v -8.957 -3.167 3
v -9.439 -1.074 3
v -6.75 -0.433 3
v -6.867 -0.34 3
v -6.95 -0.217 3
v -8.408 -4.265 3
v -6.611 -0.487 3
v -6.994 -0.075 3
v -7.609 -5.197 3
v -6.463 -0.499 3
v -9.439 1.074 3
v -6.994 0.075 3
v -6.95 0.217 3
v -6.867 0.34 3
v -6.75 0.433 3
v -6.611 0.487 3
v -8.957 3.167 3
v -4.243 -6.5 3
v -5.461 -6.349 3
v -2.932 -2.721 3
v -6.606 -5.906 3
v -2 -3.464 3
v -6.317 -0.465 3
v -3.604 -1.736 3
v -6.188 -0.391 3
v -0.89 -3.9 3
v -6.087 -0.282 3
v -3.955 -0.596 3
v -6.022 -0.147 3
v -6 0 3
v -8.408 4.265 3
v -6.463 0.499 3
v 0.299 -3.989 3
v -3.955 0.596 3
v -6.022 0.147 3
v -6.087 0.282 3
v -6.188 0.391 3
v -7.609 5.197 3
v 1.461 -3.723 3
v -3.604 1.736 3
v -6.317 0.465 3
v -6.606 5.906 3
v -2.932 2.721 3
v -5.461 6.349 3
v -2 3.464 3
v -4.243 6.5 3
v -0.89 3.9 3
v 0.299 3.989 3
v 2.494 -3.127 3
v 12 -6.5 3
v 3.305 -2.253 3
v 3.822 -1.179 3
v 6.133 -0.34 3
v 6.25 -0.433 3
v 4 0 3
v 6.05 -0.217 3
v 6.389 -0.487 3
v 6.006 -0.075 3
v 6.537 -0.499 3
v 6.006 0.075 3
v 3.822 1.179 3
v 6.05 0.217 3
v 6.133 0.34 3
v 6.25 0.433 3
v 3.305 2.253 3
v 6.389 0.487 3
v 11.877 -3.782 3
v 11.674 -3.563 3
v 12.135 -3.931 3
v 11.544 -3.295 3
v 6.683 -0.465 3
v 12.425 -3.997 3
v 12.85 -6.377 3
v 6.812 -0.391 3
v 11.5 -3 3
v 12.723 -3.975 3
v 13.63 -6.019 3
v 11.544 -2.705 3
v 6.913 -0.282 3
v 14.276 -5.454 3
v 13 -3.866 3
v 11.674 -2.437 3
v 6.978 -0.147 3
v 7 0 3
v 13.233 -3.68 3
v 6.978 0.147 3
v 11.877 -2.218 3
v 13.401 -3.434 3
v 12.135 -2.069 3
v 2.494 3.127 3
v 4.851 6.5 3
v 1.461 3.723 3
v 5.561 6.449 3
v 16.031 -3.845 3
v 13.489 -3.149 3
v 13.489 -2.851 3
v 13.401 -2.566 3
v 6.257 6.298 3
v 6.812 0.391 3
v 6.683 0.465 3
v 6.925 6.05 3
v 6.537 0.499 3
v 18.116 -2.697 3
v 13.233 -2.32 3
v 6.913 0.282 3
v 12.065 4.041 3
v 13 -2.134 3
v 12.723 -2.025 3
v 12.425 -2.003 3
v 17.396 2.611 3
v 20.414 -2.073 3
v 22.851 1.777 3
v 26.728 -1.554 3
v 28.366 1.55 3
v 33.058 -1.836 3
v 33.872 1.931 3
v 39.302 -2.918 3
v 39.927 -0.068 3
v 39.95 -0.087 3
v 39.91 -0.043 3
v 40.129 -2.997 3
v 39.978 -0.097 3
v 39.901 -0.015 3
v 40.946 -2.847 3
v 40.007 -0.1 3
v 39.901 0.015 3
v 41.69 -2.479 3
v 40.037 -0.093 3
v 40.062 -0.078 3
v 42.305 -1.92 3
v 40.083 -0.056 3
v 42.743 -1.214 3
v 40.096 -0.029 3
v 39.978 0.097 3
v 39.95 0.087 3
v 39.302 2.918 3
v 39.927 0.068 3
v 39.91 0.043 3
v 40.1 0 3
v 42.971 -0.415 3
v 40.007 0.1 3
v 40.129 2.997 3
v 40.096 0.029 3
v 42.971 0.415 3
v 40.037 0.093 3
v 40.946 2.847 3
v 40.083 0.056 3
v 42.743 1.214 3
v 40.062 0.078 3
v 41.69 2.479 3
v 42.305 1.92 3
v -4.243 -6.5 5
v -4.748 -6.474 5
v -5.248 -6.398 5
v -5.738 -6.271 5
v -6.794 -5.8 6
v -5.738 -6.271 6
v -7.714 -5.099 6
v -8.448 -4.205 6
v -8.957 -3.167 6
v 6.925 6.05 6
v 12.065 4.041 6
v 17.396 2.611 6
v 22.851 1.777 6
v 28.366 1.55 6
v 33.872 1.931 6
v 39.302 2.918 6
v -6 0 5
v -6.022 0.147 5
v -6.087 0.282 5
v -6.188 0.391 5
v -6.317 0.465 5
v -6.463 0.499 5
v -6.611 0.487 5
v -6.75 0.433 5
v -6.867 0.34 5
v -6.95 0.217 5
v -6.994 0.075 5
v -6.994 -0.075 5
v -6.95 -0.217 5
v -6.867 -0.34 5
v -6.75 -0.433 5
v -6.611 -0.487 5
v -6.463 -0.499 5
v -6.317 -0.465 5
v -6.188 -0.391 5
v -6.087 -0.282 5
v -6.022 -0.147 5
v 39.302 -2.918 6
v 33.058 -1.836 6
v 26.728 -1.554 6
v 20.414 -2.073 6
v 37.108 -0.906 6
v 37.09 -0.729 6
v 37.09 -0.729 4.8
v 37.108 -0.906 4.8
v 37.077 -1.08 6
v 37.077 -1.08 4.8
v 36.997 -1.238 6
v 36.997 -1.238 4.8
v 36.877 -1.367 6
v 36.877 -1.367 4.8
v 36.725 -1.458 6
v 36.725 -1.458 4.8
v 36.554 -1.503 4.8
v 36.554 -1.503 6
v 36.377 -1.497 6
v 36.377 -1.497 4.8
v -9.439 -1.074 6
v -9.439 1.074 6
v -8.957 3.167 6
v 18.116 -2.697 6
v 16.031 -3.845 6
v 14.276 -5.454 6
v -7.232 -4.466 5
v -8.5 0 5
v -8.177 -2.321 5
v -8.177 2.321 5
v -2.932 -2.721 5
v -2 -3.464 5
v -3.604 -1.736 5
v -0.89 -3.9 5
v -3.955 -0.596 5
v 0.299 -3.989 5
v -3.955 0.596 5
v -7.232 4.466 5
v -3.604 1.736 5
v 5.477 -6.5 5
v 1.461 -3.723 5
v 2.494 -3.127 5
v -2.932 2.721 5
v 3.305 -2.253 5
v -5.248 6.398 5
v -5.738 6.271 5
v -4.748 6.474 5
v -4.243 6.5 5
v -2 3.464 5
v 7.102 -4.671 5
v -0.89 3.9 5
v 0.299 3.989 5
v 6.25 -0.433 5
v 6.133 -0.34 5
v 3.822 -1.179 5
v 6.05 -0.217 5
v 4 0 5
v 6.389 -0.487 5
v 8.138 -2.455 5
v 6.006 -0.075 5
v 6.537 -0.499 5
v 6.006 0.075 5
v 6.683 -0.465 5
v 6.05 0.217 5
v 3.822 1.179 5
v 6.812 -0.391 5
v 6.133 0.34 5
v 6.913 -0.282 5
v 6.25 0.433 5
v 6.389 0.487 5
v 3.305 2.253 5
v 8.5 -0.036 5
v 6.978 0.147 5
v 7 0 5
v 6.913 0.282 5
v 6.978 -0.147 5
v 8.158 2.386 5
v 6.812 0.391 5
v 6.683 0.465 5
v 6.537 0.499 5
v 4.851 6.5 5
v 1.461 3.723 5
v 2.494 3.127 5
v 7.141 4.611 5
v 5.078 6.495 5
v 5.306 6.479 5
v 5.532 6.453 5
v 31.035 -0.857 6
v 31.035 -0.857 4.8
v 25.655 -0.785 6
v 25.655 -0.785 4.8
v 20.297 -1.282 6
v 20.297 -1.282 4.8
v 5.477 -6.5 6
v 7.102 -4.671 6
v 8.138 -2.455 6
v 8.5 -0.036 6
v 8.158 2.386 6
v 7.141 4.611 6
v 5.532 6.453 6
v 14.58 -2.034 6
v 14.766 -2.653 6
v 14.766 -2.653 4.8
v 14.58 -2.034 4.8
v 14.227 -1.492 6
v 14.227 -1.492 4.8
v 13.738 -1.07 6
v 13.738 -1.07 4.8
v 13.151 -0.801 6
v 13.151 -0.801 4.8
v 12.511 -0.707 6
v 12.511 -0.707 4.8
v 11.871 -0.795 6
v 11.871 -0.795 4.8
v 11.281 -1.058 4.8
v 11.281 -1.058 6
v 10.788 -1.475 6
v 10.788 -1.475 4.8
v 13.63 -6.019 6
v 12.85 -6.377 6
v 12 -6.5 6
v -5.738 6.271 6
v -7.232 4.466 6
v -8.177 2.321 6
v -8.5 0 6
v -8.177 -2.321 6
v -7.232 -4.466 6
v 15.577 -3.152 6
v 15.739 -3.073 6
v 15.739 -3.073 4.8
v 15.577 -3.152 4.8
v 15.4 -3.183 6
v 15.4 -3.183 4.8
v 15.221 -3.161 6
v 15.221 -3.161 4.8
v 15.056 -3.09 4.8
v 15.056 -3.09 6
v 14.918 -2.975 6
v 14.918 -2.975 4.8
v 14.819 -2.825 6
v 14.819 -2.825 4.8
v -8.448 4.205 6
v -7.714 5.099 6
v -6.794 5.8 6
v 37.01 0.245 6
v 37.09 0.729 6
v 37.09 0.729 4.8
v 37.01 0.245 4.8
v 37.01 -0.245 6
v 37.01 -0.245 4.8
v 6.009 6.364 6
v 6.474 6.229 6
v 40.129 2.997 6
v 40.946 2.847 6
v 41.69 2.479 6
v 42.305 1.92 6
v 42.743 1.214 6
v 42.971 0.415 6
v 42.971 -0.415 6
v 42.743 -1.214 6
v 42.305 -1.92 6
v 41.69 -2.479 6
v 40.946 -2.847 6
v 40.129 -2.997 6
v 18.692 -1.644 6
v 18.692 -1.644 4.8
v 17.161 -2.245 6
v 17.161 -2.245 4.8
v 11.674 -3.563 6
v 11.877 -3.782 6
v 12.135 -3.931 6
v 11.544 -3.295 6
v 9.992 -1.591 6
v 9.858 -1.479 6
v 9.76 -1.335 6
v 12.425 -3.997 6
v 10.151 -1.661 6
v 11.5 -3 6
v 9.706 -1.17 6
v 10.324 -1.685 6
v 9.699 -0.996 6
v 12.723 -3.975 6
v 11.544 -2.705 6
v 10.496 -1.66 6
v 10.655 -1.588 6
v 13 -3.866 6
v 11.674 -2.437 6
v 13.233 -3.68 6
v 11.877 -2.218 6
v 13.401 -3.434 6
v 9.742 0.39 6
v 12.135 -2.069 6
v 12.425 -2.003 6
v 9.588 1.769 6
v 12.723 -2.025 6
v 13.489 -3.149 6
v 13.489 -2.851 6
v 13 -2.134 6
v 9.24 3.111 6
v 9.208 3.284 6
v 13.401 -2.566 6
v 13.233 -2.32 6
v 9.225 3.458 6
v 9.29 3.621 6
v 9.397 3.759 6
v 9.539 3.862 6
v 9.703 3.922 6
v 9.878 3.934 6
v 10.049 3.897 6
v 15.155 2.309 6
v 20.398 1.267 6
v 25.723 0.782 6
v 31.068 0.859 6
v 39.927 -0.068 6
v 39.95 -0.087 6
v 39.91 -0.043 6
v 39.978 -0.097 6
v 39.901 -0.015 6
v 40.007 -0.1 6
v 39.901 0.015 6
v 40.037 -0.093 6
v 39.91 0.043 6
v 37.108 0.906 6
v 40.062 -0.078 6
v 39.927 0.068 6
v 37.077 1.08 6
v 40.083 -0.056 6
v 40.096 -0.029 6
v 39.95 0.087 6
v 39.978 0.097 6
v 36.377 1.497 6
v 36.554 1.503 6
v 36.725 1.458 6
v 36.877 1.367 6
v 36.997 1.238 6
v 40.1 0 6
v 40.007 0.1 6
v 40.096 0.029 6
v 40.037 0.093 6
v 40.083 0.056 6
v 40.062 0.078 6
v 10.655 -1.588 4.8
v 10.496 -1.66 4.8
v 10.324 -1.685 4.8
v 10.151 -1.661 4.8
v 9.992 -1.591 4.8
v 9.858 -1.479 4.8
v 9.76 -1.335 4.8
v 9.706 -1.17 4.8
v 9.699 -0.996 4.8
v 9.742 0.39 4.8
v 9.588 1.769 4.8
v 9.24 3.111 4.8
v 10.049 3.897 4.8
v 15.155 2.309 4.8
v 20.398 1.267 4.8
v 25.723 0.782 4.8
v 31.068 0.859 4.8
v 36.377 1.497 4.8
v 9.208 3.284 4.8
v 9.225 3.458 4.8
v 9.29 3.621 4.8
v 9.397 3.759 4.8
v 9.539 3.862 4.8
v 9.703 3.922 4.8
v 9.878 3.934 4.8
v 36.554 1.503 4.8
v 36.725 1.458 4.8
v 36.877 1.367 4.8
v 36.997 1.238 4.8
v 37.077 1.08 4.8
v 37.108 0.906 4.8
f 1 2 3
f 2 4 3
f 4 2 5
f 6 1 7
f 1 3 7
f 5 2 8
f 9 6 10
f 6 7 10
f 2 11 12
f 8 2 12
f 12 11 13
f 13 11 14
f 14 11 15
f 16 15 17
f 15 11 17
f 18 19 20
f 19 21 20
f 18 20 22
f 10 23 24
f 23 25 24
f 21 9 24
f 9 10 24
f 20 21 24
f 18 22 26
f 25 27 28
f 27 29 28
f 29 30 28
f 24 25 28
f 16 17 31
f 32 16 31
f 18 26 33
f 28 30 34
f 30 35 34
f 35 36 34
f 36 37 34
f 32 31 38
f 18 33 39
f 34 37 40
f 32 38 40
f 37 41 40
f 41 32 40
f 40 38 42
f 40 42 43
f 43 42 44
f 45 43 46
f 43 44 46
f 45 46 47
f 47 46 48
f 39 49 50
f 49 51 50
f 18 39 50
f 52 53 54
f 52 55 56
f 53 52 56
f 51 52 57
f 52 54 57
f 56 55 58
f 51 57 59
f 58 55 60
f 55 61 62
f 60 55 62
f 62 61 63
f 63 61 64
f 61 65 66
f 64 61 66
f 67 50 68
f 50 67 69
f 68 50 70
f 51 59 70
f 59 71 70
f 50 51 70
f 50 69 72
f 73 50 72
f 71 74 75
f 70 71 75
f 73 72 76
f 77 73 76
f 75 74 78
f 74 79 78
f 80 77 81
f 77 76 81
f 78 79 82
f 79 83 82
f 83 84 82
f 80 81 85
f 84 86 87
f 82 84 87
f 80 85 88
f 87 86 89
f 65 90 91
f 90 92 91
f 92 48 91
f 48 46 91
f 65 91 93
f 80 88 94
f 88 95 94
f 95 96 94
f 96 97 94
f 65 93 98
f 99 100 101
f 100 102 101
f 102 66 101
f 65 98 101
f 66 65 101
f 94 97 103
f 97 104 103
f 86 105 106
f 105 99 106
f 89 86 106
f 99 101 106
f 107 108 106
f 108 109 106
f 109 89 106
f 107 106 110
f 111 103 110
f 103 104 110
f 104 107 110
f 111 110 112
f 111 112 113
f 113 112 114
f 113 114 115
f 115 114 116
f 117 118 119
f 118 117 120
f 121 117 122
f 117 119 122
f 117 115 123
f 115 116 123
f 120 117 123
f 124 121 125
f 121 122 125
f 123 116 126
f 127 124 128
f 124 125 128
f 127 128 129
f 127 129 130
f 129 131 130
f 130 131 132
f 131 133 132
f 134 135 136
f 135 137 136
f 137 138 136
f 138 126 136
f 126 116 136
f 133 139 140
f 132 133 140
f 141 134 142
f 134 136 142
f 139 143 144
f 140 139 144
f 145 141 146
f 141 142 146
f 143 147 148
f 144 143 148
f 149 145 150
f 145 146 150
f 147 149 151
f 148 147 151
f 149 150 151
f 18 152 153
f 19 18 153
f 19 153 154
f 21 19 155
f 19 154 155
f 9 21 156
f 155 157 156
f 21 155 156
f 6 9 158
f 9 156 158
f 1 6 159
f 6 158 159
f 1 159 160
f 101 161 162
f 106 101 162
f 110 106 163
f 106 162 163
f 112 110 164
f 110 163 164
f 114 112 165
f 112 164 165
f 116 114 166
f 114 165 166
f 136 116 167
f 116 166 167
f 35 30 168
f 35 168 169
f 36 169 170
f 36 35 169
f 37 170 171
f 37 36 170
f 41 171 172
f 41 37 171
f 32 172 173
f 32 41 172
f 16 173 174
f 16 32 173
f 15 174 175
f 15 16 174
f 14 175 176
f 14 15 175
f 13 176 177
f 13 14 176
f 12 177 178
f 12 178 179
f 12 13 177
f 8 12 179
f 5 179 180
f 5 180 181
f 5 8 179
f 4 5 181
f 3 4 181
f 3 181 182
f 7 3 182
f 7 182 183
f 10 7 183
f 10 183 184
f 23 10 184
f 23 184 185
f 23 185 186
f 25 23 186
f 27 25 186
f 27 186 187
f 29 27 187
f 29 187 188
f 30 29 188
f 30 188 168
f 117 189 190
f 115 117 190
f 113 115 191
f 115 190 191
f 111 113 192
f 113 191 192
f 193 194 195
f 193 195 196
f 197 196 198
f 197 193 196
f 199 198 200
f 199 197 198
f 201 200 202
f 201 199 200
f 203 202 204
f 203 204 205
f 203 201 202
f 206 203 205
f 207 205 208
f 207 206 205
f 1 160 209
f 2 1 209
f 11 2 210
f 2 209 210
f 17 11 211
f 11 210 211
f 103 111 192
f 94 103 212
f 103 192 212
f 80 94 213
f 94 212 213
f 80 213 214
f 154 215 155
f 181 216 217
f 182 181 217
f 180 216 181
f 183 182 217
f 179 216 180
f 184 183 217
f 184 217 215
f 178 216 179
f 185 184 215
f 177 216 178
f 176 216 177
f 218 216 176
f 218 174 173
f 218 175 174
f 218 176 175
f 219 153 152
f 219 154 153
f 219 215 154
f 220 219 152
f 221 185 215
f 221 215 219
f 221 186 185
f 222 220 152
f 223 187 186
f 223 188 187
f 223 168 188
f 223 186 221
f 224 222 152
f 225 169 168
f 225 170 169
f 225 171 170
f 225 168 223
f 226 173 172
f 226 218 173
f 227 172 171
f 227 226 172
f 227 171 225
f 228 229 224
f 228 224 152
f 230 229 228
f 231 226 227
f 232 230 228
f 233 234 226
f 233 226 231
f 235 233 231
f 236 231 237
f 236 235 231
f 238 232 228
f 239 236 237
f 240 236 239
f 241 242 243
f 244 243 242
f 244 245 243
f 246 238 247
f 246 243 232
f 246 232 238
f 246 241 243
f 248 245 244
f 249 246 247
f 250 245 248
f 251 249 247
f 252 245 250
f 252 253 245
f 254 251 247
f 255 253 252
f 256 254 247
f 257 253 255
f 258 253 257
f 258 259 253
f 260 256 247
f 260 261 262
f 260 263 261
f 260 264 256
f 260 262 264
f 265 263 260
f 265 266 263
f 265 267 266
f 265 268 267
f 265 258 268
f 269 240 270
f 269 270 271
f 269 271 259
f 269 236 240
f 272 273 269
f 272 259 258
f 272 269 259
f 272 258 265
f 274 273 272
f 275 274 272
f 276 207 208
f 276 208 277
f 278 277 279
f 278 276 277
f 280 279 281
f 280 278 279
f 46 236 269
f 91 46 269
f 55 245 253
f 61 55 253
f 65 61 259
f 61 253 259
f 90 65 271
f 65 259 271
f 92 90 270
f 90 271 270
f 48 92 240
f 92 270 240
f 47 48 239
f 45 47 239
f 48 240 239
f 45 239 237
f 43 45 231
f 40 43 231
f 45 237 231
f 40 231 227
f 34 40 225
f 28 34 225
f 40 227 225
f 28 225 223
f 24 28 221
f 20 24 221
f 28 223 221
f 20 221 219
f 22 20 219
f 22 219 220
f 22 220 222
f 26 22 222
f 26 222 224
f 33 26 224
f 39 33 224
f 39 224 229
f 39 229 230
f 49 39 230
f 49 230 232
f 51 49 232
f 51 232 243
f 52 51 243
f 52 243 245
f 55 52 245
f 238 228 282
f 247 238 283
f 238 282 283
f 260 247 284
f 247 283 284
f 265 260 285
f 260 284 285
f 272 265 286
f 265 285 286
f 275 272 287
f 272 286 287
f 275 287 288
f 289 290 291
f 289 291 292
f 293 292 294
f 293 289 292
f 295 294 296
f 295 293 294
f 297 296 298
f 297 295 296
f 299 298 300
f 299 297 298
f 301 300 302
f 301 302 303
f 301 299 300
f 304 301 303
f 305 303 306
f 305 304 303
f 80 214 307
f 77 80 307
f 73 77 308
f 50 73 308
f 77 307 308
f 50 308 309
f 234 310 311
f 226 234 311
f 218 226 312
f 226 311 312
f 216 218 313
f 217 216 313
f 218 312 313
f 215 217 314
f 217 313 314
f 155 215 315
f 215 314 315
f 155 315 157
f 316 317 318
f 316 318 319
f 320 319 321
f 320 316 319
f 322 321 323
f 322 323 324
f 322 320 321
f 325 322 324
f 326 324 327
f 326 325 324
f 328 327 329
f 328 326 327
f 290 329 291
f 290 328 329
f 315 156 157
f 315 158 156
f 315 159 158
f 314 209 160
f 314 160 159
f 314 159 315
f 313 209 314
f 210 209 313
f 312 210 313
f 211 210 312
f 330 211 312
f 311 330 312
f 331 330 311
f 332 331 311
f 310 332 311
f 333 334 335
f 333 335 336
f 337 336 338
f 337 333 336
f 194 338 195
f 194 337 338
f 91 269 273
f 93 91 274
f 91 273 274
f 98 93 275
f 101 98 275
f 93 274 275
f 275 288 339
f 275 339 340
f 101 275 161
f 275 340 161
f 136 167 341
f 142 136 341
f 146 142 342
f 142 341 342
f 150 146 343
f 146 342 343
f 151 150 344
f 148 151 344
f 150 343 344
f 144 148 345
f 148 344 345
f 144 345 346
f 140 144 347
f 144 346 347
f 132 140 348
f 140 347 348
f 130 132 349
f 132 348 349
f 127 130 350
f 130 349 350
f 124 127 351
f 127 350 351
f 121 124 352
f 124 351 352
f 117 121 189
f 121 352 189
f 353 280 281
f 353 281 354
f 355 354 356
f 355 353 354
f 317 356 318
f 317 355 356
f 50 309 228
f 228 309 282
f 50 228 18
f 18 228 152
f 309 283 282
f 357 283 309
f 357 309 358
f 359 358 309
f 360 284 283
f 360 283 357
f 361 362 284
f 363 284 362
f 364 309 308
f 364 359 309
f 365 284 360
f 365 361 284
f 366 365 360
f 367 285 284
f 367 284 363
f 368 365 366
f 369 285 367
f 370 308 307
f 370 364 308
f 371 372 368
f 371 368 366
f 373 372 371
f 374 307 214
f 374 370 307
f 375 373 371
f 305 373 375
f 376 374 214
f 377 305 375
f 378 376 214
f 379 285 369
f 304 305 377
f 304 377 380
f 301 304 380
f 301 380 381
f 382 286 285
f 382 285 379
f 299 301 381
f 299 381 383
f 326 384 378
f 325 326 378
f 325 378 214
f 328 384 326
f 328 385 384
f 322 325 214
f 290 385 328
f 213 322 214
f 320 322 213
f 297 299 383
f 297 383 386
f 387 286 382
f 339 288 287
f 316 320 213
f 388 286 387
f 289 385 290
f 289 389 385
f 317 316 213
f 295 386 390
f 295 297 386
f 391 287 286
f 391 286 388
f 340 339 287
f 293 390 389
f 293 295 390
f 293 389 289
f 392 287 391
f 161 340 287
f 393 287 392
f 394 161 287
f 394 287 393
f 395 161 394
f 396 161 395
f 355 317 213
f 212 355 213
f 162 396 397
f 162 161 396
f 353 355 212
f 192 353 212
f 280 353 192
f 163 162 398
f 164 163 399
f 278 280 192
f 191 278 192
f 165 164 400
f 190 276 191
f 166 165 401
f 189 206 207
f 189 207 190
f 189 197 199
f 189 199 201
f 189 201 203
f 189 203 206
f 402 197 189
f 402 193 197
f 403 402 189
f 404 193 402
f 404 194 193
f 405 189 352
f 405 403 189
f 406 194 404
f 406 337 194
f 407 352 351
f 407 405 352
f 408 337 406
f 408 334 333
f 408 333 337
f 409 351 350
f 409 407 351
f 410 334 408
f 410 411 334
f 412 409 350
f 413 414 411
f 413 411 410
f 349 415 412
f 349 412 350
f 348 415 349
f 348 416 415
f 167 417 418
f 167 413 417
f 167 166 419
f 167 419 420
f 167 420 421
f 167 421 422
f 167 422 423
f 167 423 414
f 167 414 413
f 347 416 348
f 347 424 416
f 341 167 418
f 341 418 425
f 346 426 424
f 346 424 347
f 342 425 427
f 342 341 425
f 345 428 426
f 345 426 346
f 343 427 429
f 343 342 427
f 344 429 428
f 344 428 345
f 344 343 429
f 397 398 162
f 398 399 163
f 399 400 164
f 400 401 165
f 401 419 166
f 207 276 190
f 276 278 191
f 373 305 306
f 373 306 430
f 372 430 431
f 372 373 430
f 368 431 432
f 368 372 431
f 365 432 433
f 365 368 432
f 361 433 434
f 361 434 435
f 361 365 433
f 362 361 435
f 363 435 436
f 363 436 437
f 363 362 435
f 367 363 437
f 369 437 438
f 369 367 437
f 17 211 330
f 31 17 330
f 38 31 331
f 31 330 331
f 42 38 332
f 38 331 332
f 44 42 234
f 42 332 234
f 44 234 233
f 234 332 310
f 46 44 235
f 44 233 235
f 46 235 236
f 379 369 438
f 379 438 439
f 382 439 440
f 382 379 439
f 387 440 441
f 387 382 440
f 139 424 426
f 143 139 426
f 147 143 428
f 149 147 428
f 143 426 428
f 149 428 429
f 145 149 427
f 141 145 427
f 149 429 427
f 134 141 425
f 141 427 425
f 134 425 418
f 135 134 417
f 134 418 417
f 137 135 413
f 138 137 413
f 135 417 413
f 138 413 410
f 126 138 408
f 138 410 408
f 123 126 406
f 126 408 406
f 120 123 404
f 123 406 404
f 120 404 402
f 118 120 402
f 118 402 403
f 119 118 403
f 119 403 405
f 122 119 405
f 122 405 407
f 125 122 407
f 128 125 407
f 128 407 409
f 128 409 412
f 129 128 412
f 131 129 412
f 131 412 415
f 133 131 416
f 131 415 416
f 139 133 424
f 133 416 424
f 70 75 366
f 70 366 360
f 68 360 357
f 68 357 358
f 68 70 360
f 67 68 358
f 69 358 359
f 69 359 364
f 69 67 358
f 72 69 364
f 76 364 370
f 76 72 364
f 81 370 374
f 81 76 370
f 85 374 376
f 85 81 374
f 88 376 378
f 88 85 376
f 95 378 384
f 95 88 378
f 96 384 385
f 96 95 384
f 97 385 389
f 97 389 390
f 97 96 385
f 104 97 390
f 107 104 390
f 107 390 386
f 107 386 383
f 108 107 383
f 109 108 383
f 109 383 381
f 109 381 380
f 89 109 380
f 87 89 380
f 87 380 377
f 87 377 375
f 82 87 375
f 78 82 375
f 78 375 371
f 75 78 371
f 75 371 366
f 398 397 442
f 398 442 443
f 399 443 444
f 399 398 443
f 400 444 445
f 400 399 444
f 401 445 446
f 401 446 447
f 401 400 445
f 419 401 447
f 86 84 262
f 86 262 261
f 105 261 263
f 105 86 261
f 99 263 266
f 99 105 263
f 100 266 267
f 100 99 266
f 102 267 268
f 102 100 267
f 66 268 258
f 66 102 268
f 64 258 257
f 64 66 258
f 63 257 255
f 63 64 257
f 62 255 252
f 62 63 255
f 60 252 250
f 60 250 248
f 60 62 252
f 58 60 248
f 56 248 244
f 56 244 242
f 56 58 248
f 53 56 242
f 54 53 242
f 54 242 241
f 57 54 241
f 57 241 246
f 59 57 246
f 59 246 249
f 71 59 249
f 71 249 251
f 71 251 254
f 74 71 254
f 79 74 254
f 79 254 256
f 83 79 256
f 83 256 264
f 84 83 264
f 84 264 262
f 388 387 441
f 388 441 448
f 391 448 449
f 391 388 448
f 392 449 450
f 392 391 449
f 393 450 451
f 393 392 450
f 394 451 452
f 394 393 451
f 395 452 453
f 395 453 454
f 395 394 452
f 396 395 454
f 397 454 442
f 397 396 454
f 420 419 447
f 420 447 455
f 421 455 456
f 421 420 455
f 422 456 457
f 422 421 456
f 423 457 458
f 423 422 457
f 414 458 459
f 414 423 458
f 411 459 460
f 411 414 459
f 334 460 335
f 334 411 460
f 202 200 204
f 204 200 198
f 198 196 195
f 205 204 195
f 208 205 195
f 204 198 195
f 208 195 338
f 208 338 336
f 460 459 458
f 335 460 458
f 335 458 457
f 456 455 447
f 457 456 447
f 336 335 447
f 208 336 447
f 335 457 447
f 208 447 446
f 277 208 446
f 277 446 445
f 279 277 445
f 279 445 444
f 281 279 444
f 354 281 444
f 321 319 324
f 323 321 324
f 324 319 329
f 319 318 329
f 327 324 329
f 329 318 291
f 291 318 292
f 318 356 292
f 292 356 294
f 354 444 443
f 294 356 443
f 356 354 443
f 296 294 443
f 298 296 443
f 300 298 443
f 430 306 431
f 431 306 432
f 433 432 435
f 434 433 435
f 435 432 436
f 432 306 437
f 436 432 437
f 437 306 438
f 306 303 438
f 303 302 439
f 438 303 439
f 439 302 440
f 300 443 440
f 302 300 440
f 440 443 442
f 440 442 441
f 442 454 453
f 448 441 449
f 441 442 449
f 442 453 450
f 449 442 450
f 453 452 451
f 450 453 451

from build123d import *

# Parameters (mm, degrees)
SKIZZE1_W                       = 70
SKIZZE1_H                       = 30
SKIZZE1_R                       = 4
SKIZZE1_R_2                     = 0.1
LINEAR_AUSTRAGEN1_DEPTH         = 3
F_1_0_1_DIAMETER_HOLE1_D        = 1
F_2_0_2_DIAMETER_HOLE1_D        = 2
SKIZZE7_R                       = 8.5
SCHNITT_LINEAR_AUSTRAGEN1_DEPTH = 1
SKIZZE8_OUTSIDE_W               = 87.244
SKIZZE8_OUTSIDE_H               = 47.244
SCHNITT_LINEAR_AUSTRAGEN2_DEPTH = 58.087651905
SCHNITT_LINEAR_AUSTRAGEN3_DEPTH = 1.2


with BuildPart() as part:
    # Skizze1 → Linear austragen1 (new body)
    with BuildSketch(Plane.XY):
        with Locations((20, 0)):
            Rectangle(SKIZZE1_W, SKIZZE1_H)
        Circle(SKIZZE1_R, mode=Mode.SUBTRACT)
        with Locations((40, 0)):
            Circle(SKIZZE1_R_2, mode=Mode.SUBTRACT)
    extrude(amount=LINEAR_AUSTRAGEN1_DEPTH)

    # Ø1.0 (1) Diameter Hole1 (through all)
    with Locations(Plane(origin=(0, 0, 0), x_dir=(-1, 0, 0), z_dir=(0, 0, -1))):
        with Locations((6.5, 0), (-6.5, 0)):
            Hole(F_1_0_1_DIAMETER_HOLE1_D / 2)

    # Ø2.0 (2) Diameter Hole1 (through all)
    with Locations(Plane(origin=(0, 0, 0), x_dir=(1, 0, 0), z_dir=(0, 0, -1))):
        with Locations((12.5, 3)):
            Hole(F_2_0_2_DIAMETER_HOLE1_D / 2)

    # Skizze7 → Schnitt-Linear austragen1 (cut)
    with BuildSketch(Plane.XY):
        Circle(SKIZZE7_R)
    extrude(amount=SCHNITT_LINEAR_AUSTRAGEN1_DEPTH, mode=Mode.SUBTRACT)

    # Skizze8 outside → Schnitt-Linear austragen2 (cut, through all)
    with BuildSketch(Plane.XY):
        with Locations((20, 0)):
            Rectangle(SKIZZE8_OUTSIDE_W, SKIZZE8_OUTSIDE_H)
        with BuildLine():
            Line((-4.242640687, 6.5), (4.850693198, 6.5))
            ThreePointArc((4.850693198, 6.5), (5.911913676, 6.386083411), (6.924777907, 6.049524439))
            ThreePointArc((6.924777907, 6.049524439), (22.851496839, 1.777066749), (39.30182783, 2.917628424))
            ThreePointArc((39.30182783, 2.917628424), (43, 0), (39.30182783, -2.917628424))
            ThreePointArc((39.30182783, -2.917628424), (29.897933333, -1.594625688), (20.413511825, -2.073495804))
            ThreePointArc((20.413511825, -2.073495804), (17.039126957, -3.208684673), (14.276292568, -5.454096248))
            ThreePointArc((14.276292568, -5.454096248), (13.252539671, -6.226012541), (12, -6.5))
            Line((12, -6.5), (-4.242640687, -6.5))
            ThreePointArc((-4.242640687, -6.5), (-7.129392033, -5.582482905), (-8.956685895, -3.166666667))
            ThreePointArc((-8.956685895, -3.166666667), (-9.5, 0), (-8.956685895, 3.166666667))
            ThreePointArc((-8.956685895, 3.166666667), (-7.129392033, 5.582482905), (-4.242640687, 6.5))
        make_face(mode=Mode.SUBTRACT)
    extrude(amount=SCHNITT_LINEAR_AUSTRAGEN2_DEPTH, mode=Mode.SUBTRACT)

    # Skizze10 → Schnitt-Linear austragen3 (cut)
    with BuildSketch(Plane.XY):
        with BuildLine():
            ThreePointArc((36.376629725, 1.49720748), (23.054109204, 0.954513618), (10.049282761, 3.89705654))
            ThreePointArc((10.049282761, 3.89705654), (9.397134344, 3.759216075), (9.240224203, 3.111391438))
            ThreePointArc((9.240224203, 3.111391438), (9.689735111, 1.082373999), (9.699012563, -0.995818907))
            ThreePointArc((9.699012563, -0.995818907), (10.068812364, -1.631628436), (10.787531238, -1.47526722))
            ThreePointArc((10.787531238, -1.47526722), (13.150598424, -0.801345638), (14.766431088, -2.652653724))
            ThreePointArc((14.766431088, -2.652653724), (15.136326342, -3.131711101), (15.73868827, -3.072731627))
            ThreePointArc((15.73868827, -3.072731627), (17.915226797, -1.915501516), (20.297478014, -1.281955435))
            ThreePointArc((20.297478014, -1.281955435), (28.345625064, -0.749320212), (36.376629725, -1.49720748))
            ThreePointArc((36.376629725, -1.49720748), (36.94164037, -1.30691696), (37.090043464, -0.729488148))
            ThreePointArc((37.090043464, -0.729488148), (37, 0), (37.090043464, 0.729488148))
            ThreePointArc((37.090043464, 0.729488148), (36.94164037, 1.30691696), (36.376629725, 1.49720748))
        make_face()
    extrude(amount=SCHNITT_LINEAR_AUSTRAGEN3_DEPTH, mode=Mode.SUBTRACT)


with BuildPart() as body_2:
    # Mirror1: mirrored copy
    add(part.part.mirror(Plane(origin=(-15, -15, 3), x_dir=(1, 0, 0), z_dir=(0, 0, 1))))


solid = body_2.part
